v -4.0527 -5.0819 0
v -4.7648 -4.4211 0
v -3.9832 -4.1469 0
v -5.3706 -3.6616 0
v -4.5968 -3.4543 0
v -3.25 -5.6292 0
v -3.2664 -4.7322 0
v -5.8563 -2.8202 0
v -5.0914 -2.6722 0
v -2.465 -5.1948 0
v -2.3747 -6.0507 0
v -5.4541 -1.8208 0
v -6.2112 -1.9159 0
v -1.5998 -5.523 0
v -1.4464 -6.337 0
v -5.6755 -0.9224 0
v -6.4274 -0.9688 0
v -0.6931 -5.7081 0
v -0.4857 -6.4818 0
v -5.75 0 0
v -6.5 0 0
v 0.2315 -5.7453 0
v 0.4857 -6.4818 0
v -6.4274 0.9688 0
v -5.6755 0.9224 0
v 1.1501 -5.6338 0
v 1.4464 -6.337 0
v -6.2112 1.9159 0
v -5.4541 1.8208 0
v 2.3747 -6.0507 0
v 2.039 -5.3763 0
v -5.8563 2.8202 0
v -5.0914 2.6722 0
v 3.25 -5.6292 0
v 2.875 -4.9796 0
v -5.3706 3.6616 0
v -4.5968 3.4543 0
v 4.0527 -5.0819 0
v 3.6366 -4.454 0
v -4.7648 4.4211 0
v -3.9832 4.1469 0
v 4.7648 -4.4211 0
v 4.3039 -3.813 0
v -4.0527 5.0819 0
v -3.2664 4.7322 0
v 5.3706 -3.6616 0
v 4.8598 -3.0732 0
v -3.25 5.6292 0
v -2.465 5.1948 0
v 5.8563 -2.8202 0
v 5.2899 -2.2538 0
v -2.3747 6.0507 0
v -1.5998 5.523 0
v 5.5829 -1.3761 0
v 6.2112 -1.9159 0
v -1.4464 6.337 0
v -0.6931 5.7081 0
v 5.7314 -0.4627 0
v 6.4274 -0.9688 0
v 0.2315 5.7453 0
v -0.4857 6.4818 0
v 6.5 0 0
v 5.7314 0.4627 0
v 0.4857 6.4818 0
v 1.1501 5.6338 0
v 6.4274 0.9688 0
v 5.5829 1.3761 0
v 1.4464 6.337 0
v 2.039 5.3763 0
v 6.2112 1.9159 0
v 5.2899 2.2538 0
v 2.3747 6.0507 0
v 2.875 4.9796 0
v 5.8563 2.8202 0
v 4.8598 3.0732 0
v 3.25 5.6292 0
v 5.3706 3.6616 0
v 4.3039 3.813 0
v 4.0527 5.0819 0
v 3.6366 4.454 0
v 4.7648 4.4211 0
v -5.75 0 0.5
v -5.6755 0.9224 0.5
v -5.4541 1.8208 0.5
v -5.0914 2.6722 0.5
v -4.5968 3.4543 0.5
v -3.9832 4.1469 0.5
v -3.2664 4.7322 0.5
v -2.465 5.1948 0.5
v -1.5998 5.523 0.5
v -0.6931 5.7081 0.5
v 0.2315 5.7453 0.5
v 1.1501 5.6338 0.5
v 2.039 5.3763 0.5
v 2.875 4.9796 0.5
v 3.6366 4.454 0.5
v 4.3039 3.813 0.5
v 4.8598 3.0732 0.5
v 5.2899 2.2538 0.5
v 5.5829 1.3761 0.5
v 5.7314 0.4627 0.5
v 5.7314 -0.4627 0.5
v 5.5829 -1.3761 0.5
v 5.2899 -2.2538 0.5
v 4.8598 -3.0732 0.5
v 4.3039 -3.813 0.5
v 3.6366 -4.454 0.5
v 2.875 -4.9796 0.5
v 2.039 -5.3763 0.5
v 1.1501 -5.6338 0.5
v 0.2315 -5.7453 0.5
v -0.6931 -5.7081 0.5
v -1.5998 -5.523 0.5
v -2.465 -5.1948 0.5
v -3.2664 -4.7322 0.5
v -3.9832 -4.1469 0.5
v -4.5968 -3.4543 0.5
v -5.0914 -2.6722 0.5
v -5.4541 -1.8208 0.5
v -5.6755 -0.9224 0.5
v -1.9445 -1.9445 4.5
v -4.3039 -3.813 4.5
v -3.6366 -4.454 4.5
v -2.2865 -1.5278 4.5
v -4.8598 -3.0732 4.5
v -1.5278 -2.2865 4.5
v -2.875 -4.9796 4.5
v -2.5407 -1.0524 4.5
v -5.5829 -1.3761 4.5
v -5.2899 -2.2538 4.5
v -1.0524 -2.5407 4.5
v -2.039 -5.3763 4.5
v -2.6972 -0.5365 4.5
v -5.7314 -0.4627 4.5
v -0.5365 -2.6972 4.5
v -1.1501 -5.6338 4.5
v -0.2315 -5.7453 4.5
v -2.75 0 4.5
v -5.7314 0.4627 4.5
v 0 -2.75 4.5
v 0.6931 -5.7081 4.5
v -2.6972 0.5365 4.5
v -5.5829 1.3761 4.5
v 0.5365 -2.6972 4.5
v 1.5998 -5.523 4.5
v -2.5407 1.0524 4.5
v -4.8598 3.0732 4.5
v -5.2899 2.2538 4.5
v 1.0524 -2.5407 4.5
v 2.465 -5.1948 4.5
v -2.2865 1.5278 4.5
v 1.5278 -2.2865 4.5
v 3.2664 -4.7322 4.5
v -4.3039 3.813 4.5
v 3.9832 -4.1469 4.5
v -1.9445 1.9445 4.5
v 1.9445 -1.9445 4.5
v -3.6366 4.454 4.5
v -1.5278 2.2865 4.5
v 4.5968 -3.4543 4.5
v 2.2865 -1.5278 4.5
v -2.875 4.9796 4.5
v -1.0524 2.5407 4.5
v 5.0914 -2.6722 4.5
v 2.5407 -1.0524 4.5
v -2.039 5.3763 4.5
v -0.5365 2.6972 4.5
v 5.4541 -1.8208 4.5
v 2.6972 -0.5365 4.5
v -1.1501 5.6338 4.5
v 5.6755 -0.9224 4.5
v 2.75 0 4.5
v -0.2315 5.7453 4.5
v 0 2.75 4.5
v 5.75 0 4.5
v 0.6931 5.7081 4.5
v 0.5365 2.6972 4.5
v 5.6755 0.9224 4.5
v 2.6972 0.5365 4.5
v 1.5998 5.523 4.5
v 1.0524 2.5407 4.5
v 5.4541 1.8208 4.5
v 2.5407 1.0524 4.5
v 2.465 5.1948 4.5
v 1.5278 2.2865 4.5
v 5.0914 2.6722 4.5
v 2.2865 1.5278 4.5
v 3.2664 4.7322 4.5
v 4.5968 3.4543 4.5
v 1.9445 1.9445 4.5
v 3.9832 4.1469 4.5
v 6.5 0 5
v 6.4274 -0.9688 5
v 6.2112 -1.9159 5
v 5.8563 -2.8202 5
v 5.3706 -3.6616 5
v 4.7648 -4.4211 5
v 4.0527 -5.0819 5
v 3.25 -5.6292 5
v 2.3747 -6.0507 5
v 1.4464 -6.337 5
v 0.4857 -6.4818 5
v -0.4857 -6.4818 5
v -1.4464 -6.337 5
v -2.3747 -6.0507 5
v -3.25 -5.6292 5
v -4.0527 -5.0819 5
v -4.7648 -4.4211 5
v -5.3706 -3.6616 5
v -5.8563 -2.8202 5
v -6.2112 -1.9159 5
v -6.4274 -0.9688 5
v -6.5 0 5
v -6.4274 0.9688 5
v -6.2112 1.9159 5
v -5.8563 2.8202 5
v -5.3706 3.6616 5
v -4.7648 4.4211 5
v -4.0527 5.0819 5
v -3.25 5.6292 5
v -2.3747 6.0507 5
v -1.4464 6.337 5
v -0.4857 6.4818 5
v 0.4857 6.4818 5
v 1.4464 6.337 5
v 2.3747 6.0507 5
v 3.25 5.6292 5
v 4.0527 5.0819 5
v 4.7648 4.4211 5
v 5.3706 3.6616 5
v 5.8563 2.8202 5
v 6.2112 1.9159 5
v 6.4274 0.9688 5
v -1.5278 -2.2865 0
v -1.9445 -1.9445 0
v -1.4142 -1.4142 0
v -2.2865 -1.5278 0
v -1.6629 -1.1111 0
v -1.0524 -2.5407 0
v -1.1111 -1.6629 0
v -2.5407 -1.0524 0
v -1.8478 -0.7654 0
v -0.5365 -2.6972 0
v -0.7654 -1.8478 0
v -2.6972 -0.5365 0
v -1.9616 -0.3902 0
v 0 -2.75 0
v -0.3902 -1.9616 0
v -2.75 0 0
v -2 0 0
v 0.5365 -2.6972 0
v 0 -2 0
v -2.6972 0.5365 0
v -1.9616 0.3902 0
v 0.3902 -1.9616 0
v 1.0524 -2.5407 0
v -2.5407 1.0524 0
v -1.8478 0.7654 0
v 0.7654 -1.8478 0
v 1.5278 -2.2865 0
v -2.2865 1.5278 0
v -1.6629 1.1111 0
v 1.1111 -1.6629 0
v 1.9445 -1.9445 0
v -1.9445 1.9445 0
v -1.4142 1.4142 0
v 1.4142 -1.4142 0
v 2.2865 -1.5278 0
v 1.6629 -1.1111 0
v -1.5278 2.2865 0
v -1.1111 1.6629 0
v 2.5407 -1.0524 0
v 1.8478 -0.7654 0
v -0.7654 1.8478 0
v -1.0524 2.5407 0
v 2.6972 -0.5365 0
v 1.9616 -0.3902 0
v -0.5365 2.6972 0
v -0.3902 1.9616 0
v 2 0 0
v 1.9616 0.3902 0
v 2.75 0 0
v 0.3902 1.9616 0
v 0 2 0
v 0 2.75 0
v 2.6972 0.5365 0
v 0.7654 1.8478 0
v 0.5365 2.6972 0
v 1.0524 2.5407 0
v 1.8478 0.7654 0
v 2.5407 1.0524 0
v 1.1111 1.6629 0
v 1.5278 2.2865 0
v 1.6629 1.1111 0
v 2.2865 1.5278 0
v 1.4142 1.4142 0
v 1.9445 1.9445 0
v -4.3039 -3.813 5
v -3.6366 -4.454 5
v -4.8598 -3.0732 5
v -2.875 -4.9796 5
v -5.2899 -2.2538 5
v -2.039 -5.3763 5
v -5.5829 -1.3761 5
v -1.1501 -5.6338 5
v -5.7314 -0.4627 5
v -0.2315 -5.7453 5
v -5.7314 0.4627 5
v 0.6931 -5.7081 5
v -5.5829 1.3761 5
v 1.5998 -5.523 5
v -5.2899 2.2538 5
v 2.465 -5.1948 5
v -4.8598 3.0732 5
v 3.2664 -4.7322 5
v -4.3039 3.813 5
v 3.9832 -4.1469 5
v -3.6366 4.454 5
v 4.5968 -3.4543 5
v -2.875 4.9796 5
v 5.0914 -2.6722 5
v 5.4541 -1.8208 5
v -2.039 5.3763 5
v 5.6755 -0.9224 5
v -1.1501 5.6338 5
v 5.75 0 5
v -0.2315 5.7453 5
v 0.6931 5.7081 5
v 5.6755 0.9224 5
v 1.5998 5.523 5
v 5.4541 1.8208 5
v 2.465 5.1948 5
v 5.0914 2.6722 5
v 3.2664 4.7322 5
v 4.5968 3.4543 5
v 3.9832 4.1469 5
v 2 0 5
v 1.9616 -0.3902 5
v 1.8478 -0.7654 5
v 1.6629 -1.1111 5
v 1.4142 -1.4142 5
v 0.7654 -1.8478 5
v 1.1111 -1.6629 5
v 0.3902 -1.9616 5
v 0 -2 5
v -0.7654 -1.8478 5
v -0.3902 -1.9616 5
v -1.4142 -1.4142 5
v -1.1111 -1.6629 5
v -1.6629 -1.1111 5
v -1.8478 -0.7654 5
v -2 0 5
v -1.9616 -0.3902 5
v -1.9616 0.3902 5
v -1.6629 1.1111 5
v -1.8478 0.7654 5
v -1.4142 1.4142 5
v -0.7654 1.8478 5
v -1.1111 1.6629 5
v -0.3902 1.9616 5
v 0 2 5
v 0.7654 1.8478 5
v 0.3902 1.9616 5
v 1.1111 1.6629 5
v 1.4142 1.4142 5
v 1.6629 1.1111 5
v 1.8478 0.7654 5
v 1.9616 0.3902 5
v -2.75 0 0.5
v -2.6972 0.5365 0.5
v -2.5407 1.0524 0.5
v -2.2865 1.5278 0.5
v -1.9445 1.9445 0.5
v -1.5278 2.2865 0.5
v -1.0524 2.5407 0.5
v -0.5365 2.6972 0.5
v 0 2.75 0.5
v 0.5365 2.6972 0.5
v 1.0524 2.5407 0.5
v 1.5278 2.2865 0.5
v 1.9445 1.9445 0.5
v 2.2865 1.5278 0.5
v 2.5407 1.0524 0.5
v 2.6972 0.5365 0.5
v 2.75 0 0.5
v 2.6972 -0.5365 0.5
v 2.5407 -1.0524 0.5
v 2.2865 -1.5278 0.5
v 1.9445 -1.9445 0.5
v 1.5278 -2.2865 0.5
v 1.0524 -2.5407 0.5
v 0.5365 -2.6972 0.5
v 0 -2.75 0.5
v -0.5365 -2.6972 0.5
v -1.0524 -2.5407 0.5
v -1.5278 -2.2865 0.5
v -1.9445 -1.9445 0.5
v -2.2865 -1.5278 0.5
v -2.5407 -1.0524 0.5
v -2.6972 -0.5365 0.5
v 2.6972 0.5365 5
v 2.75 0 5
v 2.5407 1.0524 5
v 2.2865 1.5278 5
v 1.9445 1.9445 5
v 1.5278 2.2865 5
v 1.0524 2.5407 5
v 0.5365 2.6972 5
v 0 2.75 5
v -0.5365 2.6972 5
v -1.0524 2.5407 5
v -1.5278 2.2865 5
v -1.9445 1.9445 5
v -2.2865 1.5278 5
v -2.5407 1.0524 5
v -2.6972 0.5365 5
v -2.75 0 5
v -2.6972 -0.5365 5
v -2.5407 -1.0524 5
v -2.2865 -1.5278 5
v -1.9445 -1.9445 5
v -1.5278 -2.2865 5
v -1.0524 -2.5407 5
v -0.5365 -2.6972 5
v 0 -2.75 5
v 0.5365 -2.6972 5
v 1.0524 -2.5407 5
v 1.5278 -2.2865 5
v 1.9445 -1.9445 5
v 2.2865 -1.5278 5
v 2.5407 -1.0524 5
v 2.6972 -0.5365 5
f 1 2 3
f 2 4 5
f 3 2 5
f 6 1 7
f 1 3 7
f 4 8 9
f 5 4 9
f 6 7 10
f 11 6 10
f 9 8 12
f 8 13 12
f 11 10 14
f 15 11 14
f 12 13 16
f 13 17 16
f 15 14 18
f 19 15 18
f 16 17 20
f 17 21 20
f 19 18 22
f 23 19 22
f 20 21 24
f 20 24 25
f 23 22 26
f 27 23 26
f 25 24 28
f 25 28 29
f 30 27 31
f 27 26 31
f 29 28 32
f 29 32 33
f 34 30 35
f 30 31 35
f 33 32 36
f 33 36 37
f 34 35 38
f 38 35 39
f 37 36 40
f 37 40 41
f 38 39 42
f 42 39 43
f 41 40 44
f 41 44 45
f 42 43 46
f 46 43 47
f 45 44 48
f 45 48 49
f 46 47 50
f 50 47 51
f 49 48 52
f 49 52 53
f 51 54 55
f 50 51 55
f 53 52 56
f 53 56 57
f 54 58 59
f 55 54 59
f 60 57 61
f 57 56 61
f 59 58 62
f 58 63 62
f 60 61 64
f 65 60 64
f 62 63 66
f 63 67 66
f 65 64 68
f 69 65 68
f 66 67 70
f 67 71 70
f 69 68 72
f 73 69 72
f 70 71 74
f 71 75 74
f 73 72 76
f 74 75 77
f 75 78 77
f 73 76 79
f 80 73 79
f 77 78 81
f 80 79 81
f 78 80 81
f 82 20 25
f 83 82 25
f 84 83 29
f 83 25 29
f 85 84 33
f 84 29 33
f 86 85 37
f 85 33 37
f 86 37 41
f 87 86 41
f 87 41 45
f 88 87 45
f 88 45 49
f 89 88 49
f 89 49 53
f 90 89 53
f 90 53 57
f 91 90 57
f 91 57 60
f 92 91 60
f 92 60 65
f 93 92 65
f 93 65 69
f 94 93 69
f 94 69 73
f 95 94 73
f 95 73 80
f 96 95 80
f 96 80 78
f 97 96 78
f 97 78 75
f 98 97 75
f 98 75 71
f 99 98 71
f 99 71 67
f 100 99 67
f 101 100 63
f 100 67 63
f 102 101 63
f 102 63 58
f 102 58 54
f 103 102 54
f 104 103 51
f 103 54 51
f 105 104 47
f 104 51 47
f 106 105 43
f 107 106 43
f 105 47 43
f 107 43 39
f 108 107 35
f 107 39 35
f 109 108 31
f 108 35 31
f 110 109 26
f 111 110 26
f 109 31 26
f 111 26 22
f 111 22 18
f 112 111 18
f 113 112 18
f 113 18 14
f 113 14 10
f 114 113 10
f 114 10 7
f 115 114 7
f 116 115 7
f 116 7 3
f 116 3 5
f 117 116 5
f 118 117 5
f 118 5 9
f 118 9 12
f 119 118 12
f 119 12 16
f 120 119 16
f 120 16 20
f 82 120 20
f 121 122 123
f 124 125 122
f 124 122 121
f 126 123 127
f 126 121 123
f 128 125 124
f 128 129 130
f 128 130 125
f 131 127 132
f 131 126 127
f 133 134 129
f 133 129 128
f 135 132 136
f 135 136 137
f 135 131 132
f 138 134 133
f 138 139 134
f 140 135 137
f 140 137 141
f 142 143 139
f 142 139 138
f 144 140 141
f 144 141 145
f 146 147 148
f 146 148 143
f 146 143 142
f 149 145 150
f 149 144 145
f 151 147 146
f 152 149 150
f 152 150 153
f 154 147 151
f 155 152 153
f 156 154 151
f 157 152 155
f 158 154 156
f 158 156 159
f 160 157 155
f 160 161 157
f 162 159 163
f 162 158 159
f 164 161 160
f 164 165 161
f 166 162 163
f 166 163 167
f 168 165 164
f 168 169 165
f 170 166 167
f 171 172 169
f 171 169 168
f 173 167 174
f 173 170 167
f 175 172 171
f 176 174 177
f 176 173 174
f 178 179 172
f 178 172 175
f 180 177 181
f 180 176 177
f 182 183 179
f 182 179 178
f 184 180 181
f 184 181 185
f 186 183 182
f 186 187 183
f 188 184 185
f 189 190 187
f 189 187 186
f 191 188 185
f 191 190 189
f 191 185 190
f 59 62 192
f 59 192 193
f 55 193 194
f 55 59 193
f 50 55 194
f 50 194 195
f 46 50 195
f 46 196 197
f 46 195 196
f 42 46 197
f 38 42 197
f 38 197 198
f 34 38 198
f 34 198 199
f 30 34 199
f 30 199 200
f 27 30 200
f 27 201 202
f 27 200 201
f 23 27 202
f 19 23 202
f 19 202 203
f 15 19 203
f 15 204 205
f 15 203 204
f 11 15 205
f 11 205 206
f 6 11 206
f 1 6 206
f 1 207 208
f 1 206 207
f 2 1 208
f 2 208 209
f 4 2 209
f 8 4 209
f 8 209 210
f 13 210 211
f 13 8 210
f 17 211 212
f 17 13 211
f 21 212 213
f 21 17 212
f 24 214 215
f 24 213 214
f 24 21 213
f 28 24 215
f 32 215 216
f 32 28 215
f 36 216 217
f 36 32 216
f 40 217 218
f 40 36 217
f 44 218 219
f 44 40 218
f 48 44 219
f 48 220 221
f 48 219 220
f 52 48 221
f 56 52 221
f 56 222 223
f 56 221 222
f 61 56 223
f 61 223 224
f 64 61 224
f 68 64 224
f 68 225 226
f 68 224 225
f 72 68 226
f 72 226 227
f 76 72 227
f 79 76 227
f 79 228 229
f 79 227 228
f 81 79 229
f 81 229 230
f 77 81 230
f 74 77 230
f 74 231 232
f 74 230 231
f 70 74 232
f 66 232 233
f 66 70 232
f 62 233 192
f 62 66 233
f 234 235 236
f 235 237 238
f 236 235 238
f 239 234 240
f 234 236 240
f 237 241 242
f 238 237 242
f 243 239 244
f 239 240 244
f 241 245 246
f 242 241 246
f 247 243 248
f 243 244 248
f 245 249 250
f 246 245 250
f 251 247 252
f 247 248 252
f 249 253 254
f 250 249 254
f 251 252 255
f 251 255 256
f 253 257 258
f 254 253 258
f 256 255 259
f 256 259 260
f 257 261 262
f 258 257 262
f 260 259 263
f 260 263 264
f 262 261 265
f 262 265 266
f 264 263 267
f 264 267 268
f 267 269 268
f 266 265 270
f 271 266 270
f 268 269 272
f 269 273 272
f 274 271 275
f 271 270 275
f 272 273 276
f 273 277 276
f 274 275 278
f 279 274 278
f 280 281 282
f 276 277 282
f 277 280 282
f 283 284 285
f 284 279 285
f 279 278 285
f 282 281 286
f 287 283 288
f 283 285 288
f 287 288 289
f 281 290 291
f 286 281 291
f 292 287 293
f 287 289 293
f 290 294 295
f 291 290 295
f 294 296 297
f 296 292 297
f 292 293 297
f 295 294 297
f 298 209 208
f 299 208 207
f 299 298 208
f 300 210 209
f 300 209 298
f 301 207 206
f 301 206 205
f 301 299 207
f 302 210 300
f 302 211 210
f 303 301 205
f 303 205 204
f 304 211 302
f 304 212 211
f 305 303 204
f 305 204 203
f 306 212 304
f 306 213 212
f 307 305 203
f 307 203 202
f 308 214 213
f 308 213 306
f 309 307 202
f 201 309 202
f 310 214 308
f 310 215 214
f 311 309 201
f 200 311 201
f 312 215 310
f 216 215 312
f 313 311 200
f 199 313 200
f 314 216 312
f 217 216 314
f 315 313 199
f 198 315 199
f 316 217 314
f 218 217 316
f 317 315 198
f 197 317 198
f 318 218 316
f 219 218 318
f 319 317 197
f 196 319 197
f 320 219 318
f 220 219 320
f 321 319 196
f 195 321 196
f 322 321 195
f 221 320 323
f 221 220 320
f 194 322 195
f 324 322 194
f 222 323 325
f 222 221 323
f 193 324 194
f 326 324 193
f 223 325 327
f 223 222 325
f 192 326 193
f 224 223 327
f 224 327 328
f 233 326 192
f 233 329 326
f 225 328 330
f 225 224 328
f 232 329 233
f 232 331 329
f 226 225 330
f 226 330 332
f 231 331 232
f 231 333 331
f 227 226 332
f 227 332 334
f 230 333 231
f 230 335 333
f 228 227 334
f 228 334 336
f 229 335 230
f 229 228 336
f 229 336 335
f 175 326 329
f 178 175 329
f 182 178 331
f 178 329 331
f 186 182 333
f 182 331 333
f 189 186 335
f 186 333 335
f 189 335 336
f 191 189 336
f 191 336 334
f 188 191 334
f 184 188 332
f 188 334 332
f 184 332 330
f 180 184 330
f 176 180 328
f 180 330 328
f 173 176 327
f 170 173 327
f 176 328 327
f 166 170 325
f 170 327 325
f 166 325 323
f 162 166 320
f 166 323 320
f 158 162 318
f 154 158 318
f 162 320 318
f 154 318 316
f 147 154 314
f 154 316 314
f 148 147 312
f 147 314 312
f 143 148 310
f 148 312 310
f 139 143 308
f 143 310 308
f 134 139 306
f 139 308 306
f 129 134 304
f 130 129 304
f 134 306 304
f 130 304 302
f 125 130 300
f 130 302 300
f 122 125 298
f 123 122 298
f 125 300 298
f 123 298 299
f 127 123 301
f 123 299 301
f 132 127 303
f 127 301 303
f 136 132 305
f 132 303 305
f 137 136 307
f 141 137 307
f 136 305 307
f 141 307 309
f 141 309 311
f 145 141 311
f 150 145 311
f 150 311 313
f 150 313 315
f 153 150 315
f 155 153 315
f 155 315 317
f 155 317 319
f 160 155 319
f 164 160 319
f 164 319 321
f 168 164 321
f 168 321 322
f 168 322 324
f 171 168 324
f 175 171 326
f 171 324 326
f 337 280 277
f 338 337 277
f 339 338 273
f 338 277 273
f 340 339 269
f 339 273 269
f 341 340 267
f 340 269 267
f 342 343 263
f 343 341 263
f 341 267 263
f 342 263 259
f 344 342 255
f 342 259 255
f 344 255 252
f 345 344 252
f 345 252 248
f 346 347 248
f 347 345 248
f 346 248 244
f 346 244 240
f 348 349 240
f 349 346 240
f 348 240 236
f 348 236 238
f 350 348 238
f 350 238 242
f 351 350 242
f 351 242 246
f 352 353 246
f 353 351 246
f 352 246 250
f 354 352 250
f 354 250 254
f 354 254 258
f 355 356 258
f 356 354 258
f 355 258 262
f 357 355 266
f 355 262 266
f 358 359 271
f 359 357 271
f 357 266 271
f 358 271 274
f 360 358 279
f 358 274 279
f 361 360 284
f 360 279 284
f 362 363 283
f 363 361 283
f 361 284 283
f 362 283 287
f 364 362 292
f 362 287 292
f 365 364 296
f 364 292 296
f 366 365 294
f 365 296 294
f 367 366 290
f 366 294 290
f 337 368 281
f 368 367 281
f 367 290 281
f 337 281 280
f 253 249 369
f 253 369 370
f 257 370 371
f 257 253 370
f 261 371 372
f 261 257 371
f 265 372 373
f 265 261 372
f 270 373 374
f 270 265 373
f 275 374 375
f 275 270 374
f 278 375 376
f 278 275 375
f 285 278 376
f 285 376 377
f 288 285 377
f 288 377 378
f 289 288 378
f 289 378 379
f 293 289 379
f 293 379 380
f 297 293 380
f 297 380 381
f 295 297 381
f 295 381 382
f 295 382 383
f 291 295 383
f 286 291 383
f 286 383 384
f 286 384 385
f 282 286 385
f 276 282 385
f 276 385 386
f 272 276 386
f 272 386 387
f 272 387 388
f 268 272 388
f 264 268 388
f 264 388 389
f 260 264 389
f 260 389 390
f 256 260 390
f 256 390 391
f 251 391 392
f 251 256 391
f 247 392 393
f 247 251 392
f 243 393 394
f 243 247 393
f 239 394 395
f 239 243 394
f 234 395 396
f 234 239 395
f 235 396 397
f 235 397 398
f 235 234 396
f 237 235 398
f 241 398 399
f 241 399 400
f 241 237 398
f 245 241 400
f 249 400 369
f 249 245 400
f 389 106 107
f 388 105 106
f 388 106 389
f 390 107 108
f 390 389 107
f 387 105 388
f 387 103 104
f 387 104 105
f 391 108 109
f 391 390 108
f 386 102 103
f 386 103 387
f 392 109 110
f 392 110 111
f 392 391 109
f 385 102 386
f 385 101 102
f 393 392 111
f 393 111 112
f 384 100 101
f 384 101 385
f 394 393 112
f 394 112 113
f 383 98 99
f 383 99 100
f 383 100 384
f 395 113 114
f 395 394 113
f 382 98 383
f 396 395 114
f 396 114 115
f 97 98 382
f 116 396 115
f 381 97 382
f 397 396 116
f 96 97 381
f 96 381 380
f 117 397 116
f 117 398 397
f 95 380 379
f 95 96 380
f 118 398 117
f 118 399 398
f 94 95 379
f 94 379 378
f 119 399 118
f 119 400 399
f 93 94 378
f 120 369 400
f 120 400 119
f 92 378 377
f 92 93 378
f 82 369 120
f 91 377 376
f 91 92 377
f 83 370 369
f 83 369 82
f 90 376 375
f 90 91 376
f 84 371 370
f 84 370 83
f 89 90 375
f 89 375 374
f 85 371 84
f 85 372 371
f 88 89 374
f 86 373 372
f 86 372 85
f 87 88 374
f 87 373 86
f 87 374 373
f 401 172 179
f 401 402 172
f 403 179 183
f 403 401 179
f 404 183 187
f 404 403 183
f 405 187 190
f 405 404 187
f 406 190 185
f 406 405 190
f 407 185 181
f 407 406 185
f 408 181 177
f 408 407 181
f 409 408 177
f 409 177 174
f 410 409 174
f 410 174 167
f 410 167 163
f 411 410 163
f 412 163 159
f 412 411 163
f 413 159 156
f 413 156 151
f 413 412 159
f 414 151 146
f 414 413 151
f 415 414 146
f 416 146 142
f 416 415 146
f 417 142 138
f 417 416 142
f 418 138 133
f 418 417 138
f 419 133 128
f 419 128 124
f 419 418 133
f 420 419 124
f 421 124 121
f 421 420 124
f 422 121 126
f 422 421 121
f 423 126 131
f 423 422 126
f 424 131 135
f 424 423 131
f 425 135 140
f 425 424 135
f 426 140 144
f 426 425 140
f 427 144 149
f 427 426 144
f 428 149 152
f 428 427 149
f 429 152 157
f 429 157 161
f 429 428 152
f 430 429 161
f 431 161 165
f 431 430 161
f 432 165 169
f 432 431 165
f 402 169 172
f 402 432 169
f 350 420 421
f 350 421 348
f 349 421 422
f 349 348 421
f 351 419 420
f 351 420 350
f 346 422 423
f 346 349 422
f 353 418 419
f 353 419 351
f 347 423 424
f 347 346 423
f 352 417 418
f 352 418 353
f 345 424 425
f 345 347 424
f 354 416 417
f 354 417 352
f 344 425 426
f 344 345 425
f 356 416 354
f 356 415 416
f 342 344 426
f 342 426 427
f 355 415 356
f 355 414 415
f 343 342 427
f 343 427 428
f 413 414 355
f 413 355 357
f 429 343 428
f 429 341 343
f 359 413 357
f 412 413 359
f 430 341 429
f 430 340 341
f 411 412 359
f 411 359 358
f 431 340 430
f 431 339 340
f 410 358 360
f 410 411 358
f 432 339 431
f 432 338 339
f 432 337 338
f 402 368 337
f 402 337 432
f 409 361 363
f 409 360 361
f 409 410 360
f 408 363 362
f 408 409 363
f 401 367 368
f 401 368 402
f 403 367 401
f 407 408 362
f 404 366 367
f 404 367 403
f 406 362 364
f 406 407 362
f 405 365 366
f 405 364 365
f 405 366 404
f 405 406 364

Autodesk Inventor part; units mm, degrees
ref_plane "YZ Plane" through (0, 0, 0) normal (1, 0, 0) x (0, 1, 0)
ref_plane "XZ Plane" through (0, 0, 0) normal (0, 1, 0) x (-1, 0, 0)
ref_plane "XY Plane" through (0, 0, 0) normal (0, 0, 1) x (1, 0, 0)
sketch "Esquisse1" plane through (0, 0, 0) normal (0, 0, 1) x (1, 0, 0)
  circle A0 centre (0, 0) radius 2
  circle A1 centre (0, 0) radius 6.5
  dimension "d0" = 4
  dimension "d1" = 13
extrude "Extrusion1" add sketch "Esquisse1" along normal blind 5
sketch "Esquisse2" plane through (0, 0, 5) normal (0, 0, 1) x (1, 0, 0)
  circle A0 centre (0, 0) radius 2 projected
  circle A1 centre (0, 0) radius 6.5 projected
  circle A2 centre (0, 0) radius 2.75
  circle A3 centre (0, 0) radius 5.75
  dimension "d4" = 11.5
  dimension "d5" = 13
  dimension "d6" = 4
  dimension "d7" = 5.5
extrude "Extrusion2" cut sketch "Esquisse2" against normal blind 0.5 contours A3
sketch "Esquisse3" plane through (0, 0, 0) normal (0, 0, -1) x (-1, 0, 0)
  circle A0 centre (0, 0) radius 2 projected
  circle A1 centre (0, 0) radius 6.5 projected
  circle A2 centre (0, 0) radius 2.75
  circle A3 centre (0, 0) radius 5.75
  dimension "d12" = 11.5
  dimension "d13" = 13
  dimension "d14" = 4
  dimension "d15" = 5.5
extrude "Extrusion3" cut sketch "Esquisse3" against normal blind 0.5 contours A3
properties part number "Roulement" material "Acier"
